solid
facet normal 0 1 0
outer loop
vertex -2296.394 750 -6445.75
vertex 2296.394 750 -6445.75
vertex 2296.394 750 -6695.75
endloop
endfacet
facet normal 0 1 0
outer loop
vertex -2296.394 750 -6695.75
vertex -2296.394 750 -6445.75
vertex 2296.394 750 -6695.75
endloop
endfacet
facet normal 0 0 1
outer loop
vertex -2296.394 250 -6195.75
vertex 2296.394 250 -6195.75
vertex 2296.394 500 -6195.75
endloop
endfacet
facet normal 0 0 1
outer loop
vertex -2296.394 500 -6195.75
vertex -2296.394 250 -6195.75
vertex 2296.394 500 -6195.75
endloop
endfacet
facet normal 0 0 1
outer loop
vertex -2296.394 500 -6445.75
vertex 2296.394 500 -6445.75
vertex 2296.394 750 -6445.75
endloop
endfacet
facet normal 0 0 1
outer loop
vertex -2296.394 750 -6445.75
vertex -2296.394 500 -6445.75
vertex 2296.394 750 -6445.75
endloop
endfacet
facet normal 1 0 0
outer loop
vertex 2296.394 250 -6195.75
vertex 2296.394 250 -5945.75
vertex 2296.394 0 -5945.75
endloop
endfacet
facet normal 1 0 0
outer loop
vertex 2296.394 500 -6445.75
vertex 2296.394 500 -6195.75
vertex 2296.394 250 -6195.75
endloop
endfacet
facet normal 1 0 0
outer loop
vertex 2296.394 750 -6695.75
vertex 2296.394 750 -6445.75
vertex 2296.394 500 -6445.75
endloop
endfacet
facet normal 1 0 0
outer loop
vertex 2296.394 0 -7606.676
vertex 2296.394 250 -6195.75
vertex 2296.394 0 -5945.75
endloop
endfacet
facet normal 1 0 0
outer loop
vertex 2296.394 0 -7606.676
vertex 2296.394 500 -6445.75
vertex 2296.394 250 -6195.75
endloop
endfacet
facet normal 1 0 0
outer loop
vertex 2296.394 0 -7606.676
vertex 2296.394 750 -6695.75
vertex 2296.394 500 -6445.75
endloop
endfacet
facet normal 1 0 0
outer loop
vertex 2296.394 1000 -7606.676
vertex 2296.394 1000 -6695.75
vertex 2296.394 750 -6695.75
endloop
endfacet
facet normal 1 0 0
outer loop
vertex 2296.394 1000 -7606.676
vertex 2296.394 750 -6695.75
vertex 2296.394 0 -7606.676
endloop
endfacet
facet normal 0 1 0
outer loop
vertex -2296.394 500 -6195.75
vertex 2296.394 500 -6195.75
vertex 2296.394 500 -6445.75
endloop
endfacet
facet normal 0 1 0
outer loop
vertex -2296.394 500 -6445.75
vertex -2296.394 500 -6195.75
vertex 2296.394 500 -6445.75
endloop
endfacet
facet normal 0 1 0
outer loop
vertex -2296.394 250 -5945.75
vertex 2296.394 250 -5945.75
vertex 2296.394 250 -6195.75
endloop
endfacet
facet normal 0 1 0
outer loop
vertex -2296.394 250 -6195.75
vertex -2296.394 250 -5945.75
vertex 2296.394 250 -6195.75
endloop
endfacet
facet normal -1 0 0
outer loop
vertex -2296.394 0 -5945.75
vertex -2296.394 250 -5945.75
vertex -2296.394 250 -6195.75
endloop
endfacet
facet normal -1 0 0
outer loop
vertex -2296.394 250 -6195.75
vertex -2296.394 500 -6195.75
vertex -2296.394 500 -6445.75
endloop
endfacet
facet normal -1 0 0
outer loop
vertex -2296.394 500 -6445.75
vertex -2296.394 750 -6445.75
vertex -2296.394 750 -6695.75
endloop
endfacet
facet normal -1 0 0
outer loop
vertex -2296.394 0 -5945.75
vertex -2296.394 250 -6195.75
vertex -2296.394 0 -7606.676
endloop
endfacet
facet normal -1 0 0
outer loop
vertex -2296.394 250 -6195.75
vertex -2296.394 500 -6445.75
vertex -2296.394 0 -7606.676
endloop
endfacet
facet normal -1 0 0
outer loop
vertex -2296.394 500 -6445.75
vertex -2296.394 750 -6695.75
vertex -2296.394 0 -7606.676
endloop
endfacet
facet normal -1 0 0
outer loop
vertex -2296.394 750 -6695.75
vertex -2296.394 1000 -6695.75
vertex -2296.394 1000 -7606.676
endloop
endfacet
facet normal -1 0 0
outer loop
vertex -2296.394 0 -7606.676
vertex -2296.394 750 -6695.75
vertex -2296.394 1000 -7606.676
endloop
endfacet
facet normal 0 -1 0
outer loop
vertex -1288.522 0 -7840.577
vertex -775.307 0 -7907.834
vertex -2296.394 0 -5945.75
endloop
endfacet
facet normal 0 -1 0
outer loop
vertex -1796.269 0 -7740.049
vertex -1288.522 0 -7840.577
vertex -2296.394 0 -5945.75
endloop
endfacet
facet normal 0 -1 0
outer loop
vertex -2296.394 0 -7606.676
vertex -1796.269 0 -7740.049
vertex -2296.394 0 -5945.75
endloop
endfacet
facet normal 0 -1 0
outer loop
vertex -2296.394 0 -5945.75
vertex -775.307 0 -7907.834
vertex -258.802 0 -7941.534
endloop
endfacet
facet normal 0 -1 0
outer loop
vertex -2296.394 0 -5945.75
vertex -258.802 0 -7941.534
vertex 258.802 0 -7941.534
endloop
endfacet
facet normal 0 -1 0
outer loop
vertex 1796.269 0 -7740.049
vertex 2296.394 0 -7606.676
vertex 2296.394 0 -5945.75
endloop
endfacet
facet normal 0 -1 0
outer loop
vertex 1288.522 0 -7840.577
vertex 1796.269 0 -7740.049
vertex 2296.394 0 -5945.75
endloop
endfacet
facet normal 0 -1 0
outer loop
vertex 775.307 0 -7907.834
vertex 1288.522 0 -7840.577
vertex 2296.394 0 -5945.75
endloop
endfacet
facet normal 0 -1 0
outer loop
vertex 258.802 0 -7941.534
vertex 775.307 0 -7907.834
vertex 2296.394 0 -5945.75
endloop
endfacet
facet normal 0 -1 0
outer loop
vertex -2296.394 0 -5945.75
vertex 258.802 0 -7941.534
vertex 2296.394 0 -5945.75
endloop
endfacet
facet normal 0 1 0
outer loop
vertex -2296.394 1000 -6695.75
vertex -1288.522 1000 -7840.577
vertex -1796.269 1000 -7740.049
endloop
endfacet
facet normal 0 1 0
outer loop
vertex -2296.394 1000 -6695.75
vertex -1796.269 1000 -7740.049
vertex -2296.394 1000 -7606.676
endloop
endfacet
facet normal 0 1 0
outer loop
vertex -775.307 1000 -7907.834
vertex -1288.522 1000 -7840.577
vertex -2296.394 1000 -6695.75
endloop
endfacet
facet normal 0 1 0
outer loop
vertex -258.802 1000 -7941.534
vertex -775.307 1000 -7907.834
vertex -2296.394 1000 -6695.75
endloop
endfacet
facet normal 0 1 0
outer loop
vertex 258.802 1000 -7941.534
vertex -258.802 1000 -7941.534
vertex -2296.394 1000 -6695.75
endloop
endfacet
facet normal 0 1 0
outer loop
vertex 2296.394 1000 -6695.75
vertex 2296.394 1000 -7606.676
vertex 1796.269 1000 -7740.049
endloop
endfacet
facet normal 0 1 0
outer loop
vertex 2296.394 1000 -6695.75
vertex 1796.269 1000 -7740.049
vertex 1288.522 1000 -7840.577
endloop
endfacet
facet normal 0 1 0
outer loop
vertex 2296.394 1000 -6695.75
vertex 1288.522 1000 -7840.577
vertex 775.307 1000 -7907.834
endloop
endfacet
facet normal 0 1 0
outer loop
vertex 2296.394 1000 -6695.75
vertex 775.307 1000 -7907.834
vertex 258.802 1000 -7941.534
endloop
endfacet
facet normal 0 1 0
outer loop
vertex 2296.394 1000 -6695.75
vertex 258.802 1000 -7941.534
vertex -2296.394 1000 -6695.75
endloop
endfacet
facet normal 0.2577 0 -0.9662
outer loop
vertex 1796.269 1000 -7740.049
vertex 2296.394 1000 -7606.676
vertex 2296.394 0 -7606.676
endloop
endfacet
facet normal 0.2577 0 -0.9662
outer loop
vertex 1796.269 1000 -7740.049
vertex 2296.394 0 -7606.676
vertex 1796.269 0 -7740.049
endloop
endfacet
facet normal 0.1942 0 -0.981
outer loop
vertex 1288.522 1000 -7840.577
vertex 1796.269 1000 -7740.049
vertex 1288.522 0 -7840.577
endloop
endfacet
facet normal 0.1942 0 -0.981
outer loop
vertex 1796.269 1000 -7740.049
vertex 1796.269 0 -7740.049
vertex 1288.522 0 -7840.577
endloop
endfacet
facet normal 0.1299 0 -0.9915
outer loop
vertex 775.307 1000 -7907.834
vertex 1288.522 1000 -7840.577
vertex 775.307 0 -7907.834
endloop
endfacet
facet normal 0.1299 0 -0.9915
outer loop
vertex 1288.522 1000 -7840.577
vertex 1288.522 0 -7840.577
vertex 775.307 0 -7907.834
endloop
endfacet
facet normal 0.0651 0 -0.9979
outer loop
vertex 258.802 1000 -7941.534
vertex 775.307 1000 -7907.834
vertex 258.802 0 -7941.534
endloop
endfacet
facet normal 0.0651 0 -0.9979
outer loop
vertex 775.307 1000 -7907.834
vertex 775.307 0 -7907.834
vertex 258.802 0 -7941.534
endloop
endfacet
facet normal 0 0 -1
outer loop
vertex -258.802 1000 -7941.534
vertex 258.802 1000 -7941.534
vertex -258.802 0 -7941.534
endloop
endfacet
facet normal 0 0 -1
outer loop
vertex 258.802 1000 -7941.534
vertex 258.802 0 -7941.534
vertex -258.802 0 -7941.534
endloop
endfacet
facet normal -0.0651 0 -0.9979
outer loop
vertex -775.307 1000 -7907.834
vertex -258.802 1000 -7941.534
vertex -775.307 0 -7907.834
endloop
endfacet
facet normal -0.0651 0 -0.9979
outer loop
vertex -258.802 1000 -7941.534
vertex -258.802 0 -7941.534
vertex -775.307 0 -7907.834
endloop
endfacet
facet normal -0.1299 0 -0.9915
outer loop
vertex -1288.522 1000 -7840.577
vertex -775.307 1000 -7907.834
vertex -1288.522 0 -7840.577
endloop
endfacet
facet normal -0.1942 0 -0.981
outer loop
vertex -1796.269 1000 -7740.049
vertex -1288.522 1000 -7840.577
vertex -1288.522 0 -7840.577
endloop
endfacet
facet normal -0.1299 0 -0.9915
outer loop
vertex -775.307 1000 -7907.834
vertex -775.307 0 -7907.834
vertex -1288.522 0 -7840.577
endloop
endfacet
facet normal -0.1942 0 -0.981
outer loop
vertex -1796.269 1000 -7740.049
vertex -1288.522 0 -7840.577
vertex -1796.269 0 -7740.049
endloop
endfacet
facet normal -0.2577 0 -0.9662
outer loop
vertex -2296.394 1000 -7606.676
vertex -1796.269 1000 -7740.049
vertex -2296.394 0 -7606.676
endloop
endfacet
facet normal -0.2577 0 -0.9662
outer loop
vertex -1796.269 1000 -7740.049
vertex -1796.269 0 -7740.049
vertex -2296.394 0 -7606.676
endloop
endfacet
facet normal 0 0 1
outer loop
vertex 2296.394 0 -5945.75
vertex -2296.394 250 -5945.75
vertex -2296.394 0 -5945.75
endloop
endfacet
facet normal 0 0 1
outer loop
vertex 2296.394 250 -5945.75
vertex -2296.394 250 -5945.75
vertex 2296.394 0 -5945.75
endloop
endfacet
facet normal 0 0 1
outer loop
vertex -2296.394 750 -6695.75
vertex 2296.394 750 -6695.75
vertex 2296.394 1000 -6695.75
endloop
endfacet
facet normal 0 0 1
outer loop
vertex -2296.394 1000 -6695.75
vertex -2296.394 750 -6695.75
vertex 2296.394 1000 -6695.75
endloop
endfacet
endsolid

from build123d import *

# Parameters (mm, degrees)
SKETCH2_R           = 7945.75
BOSS_EXTRUDE1_DEPTH = 1000
SKETCH3_OUTSIDE_W   = 20392.742
SKETCH3_OUTSIDE_H   = 20392.742
SKETCH3_OUTSIDE_W_2 = 4592.7878
SKETCH3_OUTSIDE_H_2 = 4000
CUT_EXTRUDE1_DEPTH  = 1000
CUT_EXTRUDE2_DEPTH  = 5000


with BuildPart() as part:
    # Sketch2 → Boss-Extrude1 (new body)
    with BuildSketch(Plane(origin=(0, 0, 0), x_dir=(1, 0, 0), z_dir=(0, 1, 0))):
        with Locations(Location((0, 0, 0), (0, 0, 270))):
            Circle(SKETCH2_R)
    extrude(amount=BOSS_EXTRUDE1_DEPTH)

    # Sketch3 outside → Cut-Extrude1 (cut)
    with BuildSketch(Plane(origin=(0, 1000, 0), x_dir=(1, 0, 0), z_dir=(0, 1, 0))):
        Rectangle(SKETCH3_OUTSIDE_W, SKETCH3_OUTSIDE_H)
        with Locations((0, 7945.75)):
            Rectangle(SKETCH3_OUTSIDE_W_2, SKETCH3_OUTSIDE_H_2, mode=Mode.SUBTRACT)
    extrude(amount=-CUT_EXTRUDE1_DEPTH, mode=Mode.SUBTRACT)

    # Sketch4 → Cut-Extrude2 (cut)
    with BuildSketch(Plane(origin=(2296.3939, 0, 0), x_dir=(0, 0, -1), z_dir=(1, 0, 0))):
        Polygon((5945.75, 250), (6195.75, 250), (6195.75, 500), (6445.75, 500), (6445.75, 750), (6695.75, 750), (6695.75, 1000), (5945.75, 1000), align=None)
    extrude(amount=-CUT_EXTRUDE2_DEPTH, mode=Mode.SUBTRACT)


solid = part.part
